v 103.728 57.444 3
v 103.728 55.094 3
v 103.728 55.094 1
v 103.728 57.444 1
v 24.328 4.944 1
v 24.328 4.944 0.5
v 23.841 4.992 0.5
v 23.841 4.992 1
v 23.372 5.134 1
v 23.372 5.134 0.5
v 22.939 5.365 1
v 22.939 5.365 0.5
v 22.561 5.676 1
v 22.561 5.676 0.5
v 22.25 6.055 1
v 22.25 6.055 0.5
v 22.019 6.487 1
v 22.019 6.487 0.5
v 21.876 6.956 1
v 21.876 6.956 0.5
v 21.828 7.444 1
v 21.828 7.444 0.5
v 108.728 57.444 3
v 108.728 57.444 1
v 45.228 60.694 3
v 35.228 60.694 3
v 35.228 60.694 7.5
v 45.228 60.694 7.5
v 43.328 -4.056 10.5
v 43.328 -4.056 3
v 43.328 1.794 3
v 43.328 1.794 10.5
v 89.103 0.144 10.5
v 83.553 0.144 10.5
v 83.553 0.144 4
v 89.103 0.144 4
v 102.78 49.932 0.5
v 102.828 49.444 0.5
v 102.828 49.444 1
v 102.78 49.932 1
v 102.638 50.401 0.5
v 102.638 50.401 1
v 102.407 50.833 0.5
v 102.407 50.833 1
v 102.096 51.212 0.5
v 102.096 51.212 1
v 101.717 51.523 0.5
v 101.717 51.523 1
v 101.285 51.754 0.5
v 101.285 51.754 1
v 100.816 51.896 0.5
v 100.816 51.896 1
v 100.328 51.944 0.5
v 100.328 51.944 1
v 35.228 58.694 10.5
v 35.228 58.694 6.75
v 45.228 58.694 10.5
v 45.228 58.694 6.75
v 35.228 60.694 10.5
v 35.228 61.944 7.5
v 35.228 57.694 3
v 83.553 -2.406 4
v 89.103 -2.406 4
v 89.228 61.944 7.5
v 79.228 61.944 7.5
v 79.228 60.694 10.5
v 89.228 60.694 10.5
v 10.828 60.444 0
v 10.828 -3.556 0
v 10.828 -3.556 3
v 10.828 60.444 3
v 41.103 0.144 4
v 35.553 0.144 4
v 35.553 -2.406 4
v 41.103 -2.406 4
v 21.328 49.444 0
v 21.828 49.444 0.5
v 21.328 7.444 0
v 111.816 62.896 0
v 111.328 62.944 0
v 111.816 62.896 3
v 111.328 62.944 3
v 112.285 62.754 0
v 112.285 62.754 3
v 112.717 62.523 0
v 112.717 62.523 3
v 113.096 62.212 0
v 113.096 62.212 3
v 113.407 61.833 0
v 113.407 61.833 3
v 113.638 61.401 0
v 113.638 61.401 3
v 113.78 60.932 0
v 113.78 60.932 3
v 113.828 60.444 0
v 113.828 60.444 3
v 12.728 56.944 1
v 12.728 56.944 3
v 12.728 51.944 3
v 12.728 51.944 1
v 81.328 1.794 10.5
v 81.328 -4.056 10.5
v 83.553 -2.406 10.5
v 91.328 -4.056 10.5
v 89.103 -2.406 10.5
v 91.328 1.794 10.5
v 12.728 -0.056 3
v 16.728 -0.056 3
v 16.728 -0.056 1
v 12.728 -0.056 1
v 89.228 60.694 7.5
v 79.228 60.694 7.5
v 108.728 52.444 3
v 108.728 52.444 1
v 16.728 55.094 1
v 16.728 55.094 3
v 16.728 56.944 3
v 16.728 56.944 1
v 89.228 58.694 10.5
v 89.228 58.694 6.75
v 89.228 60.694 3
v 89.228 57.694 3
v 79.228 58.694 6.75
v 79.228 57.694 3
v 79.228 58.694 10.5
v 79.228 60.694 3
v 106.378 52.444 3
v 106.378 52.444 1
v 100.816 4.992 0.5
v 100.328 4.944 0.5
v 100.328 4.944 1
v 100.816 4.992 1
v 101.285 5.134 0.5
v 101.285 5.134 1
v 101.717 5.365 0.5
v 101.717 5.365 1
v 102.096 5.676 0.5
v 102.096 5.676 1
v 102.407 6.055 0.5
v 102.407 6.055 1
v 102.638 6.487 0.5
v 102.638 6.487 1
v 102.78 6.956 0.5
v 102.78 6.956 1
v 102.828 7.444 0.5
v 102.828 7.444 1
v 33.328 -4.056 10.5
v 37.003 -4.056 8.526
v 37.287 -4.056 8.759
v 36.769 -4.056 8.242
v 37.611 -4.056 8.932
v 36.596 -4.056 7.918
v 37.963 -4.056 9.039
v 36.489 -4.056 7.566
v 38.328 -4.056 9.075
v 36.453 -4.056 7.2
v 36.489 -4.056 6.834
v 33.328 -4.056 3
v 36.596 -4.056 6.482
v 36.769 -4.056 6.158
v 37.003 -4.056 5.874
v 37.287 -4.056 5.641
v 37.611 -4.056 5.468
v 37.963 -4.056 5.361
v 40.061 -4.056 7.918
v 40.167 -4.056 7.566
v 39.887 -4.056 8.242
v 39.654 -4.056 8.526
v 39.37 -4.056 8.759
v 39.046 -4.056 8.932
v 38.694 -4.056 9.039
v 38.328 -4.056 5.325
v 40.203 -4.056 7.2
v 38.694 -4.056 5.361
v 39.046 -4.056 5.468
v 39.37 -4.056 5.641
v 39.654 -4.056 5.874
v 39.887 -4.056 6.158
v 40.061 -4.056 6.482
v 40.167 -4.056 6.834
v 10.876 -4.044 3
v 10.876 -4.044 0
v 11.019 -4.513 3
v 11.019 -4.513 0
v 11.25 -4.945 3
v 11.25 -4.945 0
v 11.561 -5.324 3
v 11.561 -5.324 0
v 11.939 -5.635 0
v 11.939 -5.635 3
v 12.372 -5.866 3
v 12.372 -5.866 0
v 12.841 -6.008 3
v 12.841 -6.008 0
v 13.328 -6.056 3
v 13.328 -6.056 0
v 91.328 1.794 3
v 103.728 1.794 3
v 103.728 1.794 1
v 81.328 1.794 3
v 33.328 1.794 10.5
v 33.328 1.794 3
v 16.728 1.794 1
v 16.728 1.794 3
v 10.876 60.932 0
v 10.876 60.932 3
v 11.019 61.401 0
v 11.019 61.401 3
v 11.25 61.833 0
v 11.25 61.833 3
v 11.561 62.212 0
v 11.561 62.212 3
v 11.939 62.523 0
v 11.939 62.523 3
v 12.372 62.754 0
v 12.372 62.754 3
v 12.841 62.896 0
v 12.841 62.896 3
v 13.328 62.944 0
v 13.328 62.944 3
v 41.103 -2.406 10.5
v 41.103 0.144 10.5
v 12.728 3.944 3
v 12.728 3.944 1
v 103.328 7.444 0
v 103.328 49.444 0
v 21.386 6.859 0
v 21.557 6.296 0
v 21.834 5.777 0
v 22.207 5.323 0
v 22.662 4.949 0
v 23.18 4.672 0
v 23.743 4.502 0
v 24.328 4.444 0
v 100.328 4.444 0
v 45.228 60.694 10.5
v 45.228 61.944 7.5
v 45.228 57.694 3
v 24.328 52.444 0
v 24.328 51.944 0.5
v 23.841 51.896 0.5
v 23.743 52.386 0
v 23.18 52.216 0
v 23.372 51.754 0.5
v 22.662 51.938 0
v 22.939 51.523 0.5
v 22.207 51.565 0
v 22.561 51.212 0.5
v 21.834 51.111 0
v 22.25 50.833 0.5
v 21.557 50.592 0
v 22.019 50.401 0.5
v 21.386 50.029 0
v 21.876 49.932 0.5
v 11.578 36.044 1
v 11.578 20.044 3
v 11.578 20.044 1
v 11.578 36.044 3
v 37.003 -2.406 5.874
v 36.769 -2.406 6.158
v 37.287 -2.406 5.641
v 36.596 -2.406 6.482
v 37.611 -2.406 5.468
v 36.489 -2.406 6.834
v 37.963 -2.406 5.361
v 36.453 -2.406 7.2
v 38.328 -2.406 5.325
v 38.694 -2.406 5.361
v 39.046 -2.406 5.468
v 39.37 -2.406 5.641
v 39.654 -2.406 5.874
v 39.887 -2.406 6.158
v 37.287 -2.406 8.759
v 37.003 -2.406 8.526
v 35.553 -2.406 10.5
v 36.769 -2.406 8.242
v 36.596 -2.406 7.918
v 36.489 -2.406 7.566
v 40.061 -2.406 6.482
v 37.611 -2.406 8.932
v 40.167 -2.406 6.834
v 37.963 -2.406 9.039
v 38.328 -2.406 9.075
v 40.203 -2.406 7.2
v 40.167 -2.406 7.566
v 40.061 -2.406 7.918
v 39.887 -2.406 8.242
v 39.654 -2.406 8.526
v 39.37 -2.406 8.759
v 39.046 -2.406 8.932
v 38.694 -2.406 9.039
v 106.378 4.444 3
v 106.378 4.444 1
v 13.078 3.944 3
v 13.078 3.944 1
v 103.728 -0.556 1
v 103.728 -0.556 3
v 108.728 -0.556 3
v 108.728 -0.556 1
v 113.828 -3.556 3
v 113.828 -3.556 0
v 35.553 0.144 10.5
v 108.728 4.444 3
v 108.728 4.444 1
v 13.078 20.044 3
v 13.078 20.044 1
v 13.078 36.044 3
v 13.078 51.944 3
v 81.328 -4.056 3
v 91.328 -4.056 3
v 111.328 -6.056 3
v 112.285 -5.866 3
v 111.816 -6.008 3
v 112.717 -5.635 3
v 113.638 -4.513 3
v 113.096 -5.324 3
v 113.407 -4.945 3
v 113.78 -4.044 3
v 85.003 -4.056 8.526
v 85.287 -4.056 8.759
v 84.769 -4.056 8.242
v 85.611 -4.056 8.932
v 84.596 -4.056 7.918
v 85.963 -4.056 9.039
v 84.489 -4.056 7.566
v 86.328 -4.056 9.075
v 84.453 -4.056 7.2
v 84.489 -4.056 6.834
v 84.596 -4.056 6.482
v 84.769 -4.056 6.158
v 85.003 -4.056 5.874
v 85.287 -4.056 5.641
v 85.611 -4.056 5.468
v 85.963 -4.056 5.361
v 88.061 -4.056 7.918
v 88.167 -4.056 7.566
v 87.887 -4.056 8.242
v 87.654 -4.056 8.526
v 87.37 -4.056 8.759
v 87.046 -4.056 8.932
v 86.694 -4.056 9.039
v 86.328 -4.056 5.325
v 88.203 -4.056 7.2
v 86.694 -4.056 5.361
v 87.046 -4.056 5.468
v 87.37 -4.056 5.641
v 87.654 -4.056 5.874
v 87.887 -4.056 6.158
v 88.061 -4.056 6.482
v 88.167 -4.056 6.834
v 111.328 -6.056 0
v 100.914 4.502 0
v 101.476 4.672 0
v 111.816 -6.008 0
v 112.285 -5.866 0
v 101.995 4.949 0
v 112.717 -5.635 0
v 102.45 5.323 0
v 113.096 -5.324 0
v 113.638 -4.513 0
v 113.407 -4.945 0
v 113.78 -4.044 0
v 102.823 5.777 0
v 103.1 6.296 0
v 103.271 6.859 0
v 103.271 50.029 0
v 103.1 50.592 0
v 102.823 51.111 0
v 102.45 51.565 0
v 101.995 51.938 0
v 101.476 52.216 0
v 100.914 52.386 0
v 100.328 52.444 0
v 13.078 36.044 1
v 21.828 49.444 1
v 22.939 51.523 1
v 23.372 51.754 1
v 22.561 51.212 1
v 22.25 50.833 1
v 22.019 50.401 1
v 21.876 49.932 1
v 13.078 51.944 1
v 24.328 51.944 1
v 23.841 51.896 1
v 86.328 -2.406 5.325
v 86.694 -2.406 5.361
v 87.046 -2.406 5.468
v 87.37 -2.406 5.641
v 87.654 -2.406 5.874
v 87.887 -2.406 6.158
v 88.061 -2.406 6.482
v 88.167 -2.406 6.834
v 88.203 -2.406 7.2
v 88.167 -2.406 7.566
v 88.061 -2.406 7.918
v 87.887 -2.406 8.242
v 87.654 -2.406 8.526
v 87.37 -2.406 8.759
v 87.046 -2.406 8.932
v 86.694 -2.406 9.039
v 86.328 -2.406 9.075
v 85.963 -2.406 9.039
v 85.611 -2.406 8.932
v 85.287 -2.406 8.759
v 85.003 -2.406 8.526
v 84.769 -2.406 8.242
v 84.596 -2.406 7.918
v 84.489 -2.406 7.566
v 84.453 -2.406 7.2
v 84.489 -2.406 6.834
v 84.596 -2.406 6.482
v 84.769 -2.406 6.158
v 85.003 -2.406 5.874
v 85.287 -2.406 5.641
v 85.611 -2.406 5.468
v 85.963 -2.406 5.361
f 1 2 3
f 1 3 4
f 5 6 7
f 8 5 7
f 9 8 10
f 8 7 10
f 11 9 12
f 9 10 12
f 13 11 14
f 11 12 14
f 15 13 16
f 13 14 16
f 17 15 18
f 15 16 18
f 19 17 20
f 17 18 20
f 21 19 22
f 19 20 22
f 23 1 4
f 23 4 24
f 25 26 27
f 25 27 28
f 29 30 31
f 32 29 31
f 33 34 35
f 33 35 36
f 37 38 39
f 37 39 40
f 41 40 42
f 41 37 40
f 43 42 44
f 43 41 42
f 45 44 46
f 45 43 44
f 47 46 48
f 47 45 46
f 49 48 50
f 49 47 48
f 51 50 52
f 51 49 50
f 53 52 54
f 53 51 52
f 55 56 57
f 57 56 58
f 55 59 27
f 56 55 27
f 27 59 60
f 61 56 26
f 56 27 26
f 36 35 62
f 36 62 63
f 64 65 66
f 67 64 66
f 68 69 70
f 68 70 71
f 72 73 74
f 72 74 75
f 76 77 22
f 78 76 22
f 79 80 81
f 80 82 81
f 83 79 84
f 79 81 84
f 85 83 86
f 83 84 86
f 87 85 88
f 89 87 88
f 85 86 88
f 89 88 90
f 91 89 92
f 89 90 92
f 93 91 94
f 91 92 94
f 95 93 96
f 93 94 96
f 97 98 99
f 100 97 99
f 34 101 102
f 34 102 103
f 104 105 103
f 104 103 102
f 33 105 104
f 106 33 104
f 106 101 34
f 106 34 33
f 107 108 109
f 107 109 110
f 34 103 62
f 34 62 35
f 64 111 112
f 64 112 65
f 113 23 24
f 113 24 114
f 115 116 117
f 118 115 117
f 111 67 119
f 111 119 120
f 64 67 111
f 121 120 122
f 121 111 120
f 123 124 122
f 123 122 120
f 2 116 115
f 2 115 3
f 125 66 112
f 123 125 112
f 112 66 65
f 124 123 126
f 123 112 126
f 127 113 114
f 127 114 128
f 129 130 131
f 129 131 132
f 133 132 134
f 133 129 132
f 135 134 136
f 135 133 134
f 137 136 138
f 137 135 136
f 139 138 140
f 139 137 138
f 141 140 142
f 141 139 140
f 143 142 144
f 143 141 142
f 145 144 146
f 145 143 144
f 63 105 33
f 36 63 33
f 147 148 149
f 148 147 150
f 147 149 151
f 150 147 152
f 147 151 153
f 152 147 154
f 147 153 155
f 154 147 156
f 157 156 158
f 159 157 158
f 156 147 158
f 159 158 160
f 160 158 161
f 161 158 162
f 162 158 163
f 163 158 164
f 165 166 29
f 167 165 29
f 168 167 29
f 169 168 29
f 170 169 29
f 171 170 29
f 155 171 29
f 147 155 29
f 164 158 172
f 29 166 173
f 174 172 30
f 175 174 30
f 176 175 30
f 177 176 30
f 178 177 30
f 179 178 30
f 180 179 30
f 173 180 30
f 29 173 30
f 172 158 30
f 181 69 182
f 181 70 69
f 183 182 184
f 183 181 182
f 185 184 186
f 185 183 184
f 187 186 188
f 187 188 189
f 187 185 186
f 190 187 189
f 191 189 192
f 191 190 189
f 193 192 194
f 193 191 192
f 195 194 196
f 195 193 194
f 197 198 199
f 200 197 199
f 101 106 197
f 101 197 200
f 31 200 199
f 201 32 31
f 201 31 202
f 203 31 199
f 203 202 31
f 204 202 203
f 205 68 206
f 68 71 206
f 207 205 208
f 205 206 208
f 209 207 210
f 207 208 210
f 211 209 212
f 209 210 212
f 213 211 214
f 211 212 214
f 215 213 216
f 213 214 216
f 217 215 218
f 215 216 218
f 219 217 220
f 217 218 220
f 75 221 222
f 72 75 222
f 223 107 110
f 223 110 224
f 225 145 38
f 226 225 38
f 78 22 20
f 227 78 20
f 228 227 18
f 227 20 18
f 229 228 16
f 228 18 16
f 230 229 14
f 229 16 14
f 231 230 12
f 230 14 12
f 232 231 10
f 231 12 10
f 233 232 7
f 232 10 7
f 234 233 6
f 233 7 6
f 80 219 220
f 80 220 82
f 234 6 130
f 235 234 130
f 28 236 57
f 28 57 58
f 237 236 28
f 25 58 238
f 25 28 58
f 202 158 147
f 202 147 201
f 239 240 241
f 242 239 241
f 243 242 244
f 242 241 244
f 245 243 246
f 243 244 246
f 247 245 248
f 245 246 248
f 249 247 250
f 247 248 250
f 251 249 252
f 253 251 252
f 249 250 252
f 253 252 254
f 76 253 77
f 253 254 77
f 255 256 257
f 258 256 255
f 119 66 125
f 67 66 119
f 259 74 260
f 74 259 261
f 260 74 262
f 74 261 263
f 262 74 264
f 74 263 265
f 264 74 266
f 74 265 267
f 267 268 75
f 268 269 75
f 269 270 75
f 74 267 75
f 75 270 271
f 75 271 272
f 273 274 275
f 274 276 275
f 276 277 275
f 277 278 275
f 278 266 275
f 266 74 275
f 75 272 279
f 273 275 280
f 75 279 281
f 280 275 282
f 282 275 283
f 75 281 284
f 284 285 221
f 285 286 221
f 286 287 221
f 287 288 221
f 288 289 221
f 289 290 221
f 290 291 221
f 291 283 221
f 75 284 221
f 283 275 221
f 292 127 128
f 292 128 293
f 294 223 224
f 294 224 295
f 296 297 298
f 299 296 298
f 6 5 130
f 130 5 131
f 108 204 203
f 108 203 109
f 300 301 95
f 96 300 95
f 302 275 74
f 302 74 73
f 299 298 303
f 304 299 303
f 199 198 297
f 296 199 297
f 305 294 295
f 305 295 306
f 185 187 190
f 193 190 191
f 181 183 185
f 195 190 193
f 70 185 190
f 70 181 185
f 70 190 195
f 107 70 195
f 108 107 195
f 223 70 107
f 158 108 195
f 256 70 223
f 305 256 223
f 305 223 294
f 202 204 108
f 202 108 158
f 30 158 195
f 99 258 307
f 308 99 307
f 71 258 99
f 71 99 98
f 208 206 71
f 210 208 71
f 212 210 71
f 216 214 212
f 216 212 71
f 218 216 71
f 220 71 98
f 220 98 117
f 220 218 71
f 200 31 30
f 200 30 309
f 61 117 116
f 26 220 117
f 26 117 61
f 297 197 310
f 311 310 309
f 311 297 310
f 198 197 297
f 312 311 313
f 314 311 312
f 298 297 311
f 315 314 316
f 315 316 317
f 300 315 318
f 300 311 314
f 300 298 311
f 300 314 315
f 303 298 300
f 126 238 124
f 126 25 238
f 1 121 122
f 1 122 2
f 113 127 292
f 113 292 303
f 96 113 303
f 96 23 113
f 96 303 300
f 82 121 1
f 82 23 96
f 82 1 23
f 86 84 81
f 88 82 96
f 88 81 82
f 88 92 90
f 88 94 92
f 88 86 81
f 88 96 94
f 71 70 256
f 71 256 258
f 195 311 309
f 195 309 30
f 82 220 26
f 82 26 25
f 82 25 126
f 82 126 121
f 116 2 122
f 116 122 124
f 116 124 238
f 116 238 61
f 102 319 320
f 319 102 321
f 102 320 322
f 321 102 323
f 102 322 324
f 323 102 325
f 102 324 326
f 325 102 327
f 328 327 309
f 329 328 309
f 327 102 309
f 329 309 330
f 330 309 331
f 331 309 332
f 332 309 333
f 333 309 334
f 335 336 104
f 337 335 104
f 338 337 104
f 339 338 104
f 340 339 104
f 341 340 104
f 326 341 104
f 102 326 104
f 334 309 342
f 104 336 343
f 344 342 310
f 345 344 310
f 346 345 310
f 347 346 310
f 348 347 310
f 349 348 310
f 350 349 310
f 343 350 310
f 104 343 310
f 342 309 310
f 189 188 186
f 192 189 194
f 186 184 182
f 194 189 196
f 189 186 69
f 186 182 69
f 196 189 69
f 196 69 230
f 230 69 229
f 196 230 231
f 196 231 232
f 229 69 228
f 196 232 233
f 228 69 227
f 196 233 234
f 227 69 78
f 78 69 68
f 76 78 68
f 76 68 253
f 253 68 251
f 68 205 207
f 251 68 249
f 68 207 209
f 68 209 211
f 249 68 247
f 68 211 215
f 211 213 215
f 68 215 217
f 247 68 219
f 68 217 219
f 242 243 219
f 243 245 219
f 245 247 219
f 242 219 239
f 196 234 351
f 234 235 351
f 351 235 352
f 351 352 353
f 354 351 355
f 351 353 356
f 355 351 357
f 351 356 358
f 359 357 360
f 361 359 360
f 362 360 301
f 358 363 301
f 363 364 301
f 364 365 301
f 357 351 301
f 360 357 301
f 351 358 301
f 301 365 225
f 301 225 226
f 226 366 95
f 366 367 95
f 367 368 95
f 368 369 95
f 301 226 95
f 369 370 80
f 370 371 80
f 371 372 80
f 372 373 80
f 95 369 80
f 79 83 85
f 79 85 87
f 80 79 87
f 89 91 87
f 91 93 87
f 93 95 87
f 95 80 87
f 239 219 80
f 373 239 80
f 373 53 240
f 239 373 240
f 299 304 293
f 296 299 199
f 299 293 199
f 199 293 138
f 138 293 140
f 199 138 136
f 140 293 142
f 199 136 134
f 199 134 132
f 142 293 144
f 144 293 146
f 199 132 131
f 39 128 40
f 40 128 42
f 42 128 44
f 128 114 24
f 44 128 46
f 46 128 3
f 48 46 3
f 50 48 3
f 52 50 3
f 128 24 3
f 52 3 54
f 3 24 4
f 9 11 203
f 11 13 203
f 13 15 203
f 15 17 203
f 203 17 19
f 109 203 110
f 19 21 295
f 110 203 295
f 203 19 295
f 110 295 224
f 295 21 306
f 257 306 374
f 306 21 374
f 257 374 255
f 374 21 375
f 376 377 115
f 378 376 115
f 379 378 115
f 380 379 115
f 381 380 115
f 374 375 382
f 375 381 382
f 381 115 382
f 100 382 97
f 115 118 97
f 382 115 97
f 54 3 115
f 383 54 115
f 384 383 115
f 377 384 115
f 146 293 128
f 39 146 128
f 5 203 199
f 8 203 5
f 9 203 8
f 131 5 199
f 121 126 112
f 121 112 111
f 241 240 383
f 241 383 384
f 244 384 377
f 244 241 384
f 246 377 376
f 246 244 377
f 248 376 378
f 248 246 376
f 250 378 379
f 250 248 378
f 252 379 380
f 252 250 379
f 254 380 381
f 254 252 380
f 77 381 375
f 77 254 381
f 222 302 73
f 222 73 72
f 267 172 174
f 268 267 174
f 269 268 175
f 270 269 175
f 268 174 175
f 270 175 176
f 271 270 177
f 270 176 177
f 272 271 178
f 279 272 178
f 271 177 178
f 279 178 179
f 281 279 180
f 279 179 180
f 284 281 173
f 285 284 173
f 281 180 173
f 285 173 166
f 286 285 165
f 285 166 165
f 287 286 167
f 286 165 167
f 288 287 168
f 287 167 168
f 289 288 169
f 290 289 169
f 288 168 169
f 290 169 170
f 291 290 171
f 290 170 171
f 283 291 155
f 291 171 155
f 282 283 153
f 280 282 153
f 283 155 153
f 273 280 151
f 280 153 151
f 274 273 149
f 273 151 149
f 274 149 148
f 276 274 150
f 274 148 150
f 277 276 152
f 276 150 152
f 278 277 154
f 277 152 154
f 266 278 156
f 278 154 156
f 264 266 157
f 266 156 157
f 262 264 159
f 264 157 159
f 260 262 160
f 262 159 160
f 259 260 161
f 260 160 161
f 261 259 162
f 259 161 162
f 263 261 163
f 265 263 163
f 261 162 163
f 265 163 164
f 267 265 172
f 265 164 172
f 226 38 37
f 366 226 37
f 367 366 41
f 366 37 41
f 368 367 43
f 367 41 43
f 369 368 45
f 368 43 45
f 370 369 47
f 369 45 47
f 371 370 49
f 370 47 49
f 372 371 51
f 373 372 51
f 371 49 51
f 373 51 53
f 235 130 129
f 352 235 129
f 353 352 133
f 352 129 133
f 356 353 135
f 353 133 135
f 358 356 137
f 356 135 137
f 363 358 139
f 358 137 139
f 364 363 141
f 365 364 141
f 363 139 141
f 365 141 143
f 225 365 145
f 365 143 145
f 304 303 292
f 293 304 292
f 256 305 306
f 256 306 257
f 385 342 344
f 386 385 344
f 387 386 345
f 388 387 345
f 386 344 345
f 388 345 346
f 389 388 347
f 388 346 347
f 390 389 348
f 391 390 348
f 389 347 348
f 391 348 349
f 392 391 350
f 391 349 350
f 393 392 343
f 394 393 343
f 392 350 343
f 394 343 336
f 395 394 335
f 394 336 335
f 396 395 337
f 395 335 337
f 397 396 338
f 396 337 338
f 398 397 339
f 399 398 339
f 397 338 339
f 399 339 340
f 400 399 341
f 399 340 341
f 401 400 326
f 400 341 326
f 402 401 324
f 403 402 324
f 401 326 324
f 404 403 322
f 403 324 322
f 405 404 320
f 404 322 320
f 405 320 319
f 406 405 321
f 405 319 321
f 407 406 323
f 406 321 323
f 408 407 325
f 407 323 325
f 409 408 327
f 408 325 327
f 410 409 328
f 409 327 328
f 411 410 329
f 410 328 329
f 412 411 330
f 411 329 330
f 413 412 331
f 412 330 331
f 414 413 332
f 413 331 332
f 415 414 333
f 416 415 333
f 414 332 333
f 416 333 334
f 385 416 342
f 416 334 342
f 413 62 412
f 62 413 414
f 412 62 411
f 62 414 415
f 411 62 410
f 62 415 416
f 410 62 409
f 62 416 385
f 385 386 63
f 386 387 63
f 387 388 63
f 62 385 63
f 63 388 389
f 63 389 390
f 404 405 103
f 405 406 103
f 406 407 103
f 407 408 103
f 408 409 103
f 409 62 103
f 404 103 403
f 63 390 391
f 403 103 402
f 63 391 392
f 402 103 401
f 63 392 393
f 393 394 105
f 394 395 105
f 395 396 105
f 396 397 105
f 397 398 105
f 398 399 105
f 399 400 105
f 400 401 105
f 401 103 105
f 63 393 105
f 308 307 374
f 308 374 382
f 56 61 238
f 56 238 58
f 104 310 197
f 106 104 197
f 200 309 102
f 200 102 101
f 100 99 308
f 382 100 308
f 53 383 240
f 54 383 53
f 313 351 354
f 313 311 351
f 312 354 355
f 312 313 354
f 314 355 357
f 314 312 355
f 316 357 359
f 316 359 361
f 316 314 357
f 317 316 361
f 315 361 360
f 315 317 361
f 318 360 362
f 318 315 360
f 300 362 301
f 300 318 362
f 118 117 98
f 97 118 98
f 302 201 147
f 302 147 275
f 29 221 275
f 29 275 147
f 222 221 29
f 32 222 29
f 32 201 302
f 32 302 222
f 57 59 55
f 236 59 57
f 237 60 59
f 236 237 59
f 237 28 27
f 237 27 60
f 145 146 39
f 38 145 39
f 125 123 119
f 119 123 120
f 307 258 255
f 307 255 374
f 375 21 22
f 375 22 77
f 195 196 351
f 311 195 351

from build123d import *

# Parameters (mm, degrees)
SKETCH1_W           = 103
SKETCH1_H           = 69
BOSS_EXTRUDE1_DEPTH = 3
SKETCH2_W           = 81
SKETCH2_H           = 47
CUT_EXTRUDE1_DEPTH  = 3
CUT_EXTRUDE2_DEPTH  = 2
FILLET2_R           = 2.5
FILLET3_R           = 2.5
CHAMFER1_SIZE       = 0.5
CUT_EXTRUDE3_DEPTH  = 2
SKETCH5_W           = 10
SKETCH5_H           = 2
BOSS_EXTRUDE2_DEPTH = 7.5
SKETCH6_W           = 10
SKETCH6_H           = 5.85
BOSS_EXTRUDE3_DEPTH = 7.5
BOSS_EXTRUDE4_DEPTH = 10
BOSS_EXTRUDE5_DEPTH = 10
SKETCH9_W           = 5.55
SKETCH9_H           = 2.55
CUT_EXTRUDE4_DEPTH  = 6.5
SKETCH10_R          = 1.875
CUT_EXTRUDE5_DEPTH  = 1.65


with BuildPart() as part:
    # Sketch1 → Boss-Extrude1 (new body)
    with BuildSketch(Plane.XY):
        with Locations((62.328366078, 28.443882797)):
            Rectangle(SKETCH1_W, SKETCH1_H)
    extrude(amount=BOSS_EXTRUDE1_DEPTH)

    # Sketch2 → Cut-Extrude1 (cut)
    with BuildSketch(Plane.XY.offset(3)):
        with Locations((62.328366078, 28.443882797)):
            Rectangle(SKETCH2_W, SKETCH2_H)
    extrude(amount=-CUT_EXTRUDE1_DEPTH, mode=Mode.SUBTRACT)

    # Sketch3 → Cut-Extrude2 (cut)
    with BuildSketch(Plane.XY.offset(3)):
        Polygon((13.078366078, 55.093882797), (106.378366078, 55.093882797), (106.378366078, 1.793882797), (13.078366078, 1.793882797), (13.078366078, 20.043882797), (11.578366078, 20.043882797), (11.578366078, 36.043882797), (13.078366078, 36.043882797), align=None)
    extrude(amount=-CUT_EXTRUDE2_DEPTH, mode=Mode.SUBTRACT)

    # Fillet2
    fillet2_edges = [part.edges().sort_by_distance(p)[0] for p in [
        (113.828366078, -6.056117203, 1.5),
        (10.828366078, -6.056117203, 1.5),
        (10.828366078, 62.943882797, 1.5),
        (113.828366078, 62.943882797, 1.5),
    ]]
    fillet(fillet2_edges, radius=FILLET2_R)

    # Fillet3
    fillet3_edges = [part.edges().sort_by_distance(p)[0] for p in [
        (21.828366078, 4.943882797, 0.5),
        (21.828366078, 51.943882797, 0.5),
        (102.828366078, 51.943882797, 0.5),
        (102.828366078, 4.943882797, 0.5),
    ]]
    fillet(fillet3_edges, radius=FILLET3_R)

    # Chamfer1
    chamfer1_edges = [part.edges().sort_by_distance(p)[0] for p in [
        (22.560599125, 51.21164975, 0),
        (22.560599125, 5.676115844, 0),
        (102.096133031, 5.676115844, 0),
        (102.096133031, 51.21164975, 0),
        (21.828366078, 28.443882797, 0),
        (62.328366078, 51.943882797, 0),
        (62.328366078, 4.943882797, 0),
        (102.828366078, 28.443882797, 0),
    ]]
    chamfer(chamfer1_edges, length=CHAMFER1_SIZE)

    # Sketch4 → Cut-Extrude3 (cut)
    with BuildSketch(Plane.XY.offset(3)):
        Polygon((16.728366078, 55.093882797), (16.728366078, 56.943882797), (12.728366078, 56.943882797), (12.728366078, 51.943882797), (13.078366078, 51.943882797), (13.078366078, 55.093882797), align=None)
        Polygon((103.728366078, 55.093882797), (103.728366078, 57.443882797), (108.728366078, 57.443882797), (108.728366078, 52.443882797), (106.378366078, 52.443882797), (106.378366078, 55.093882797), align=None)
        Polygon((16.728366078, 1.793882797), (16.728366078, -0.056117203), (12.728366078, -0.056117203), (12.728366078, 3.943882797), (13.078366078, 3.943882797), (13.078366078, 1.793882797), align=None)
        Polygon((103.728366078, 1.793882797), (103.728366078, -0.556117203), (108.728366078, -0.556117203), (108.728366078, 4.443882797), (106.378366078, 4.443882797), (106.378366078, 1.793882797), align=None)
    extrude(amount=-CUT_EXTRUDE3_DEPTH, mode=Mode.SUBTRACT)

    # Sketch5 → Boss-Extrude2 (add)
    with BuildSketch(Plane.XY.offset(3)):
        with Locations((84.228366078, 59.693882797)):
            Rectangle(SKETCH5_W, SKETCH5_H)
        with Locations((40.228366078, 59.693882797)):
            Rectangle(SKETCH5_W, SKETCH5_H)
    extrude(amount=BOSS_EXTRUDE2_DEPTH)

    # Sketch6 → Boss-Extrude3 (add)
    with BuildSketch(Plane.XY.offset(3)):
        with Locations((86.328366078, -1.131117203)):
            Rectangle(SKETCH6_W, SKETCH6_H)
        with Locations((38.328366078, -1.131117203)):
            Rectangle(SKETCH6_W, SKETCH6_H)
    extrude(amount=BOSS_EXTRUDE3_DEPTH)

    # Sketch7 → Boss-Extrude4 (add)
    with BuildSketch(Plane.ZY.offset(-35.228366078)):
        Polygon((7.5, 60.693882797), (7.5, 61.943882797), (10.5, 60.693882797), align=None)
        Polygon((3, 57.693882797), (6.75, 58.693882797), (3, 58.693882797), align=None)
    extrude(amount=-BOSS_EXTRUDE4_DEPTH)

    # Sketch8 → Boss-Extrude5 (add)
    with BuildSketch(Plane.ZY.offset(-79.228366078)):
        Polygon((7.5, 60.693882797), (7.5, 61.943882797), (10.5, 60.693882797), align=None)
        Polygon((6.75, 58.693882797), (3, 58.693882797), (3, 57.693882797), align=None)
    extrude(amount=-BOSS_EXTRUDE5_DEPTH)

    # Sketch9 → Cut-Extrude4 (cut)
    with BuildSketch(Plane.XY.offset(10.5)):
        with Locations((86.328366078, -1.131117203)):
            Rectangle(SKETCH9_W, SKETCH9_H)
        with Locations((38.328366078, -1.131117203)):
            Rectangle(SKETCH9_W, SKETCH9_H)
    extrude(amount=-CUT_EXTRUDE4_DEPTH, mode=Mode.SUBTRACT)

    # Sketch10 → Cut-Extrude5 (cut)
    with BuildSketch(Plane.XZ.offset(4.056117203)):
        with Locations(Location((38.328366078, 7.2, 0), (0, 0, 270))):
            Circle(SKETCH10_R)
        with Locations(Location((86.328366078, 7.2, 0), (0, 0, 270))):
            Circle(SKETCH10_R)
    extrude(amount=-CUT_EXTRUDE5_DEPTH, mode=Mode.SUBTRACT)


solid = part.part
